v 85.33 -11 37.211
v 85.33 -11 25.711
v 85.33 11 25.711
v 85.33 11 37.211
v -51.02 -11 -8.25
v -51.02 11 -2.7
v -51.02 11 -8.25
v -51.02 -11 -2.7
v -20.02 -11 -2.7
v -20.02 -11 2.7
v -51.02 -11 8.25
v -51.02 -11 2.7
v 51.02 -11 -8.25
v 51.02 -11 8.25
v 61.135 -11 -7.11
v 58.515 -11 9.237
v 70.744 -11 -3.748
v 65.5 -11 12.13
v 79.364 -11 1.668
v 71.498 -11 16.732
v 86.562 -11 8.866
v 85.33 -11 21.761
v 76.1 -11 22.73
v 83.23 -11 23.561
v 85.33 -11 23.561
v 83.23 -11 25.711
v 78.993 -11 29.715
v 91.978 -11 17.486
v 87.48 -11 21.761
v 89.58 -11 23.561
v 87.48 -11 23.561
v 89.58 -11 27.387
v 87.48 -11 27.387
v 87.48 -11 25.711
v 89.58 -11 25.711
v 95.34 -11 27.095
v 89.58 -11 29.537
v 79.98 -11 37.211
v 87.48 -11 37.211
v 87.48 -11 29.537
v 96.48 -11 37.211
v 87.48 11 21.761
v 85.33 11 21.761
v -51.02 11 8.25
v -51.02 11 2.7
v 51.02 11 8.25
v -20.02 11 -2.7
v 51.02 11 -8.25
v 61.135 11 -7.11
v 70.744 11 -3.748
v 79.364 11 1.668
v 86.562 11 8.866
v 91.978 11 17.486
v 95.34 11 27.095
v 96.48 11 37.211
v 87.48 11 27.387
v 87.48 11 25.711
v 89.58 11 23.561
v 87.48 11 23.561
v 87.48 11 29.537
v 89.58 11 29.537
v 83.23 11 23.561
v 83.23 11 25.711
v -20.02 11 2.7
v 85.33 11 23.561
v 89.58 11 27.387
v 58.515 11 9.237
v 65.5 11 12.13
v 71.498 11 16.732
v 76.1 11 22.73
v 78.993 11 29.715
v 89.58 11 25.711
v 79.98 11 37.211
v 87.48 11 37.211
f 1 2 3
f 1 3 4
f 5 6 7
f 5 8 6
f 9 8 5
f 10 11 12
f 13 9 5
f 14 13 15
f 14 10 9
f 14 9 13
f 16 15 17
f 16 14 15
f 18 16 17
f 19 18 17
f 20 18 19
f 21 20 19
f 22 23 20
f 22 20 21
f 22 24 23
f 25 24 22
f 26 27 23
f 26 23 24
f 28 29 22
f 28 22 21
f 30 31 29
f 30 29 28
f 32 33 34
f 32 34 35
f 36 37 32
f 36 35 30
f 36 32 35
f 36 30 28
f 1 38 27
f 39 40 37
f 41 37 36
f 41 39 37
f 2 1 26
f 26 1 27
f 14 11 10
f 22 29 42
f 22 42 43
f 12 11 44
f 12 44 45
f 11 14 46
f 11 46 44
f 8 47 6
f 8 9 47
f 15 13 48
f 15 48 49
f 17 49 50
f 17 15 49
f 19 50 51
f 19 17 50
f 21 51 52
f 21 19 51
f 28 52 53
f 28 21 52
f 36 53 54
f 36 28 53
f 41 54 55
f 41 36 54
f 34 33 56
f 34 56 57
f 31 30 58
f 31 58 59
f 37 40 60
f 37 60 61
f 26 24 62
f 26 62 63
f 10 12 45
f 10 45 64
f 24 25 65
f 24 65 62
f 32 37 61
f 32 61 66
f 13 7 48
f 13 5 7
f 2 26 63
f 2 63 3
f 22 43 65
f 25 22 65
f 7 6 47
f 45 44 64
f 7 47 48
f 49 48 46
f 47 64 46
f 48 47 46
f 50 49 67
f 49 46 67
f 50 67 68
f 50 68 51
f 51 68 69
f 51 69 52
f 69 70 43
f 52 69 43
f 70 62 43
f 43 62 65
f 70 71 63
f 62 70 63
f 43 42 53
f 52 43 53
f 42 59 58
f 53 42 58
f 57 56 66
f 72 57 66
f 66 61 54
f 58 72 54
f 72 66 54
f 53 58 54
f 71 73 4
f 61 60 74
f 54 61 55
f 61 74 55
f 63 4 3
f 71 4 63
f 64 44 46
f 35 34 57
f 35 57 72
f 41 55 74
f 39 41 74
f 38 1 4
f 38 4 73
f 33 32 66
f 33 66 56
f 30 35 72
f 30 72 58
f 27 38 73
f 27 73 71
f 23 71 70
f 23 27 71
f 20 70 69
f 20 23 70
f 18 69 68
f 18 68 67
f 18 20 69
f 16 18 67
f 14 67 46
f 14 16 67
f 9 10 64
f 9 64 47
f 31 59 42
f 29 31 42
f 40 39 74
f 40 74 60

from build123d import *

# Parameters (mm, degrees)
F1_DEPTH = 11


# Not quite as in the source:
# - ends of sketch curves that miss each other by under 0.0002 mm in the source are joined
# - a feature names something its author has since deleted; it is built from what else it names


with BuildPart() as f1:
    # F0 (on Front) → F1 (new body, symmetric)
    with BuildSketch(Plane.XZ):
        Polygon((-51.0195, -8.25), (51.0195, -8.25), (51.0195, 8.25), (-51.0195, 8.25), (-51.0195, 2.7), (-20.0195, 2.7), (-20.0195, -2.7), (-51.0195, -2.7), align=None)
        with BuildLine():
            Line((51.0195, 8.25), (51.0195, -8.25))
            ThreePointArc((51.0195, -8.25), (83.1651110764, 5.0651480786), (96.4802591551, 37.2107591551))
            Line((96.4802591551, 37.2107591551), (87.4802576721, 37.2107591551))
            Line((87.4802576721, 37.2107591551), (87.4802576721, 29.5374569684))
            Line((87.4802576721, 29.5374569684), (89.5802576721, 29.5374569684))
            Line((89.5802576721, 29.5374569684), (89.5802576721, 27.3874569684))
            Line((89.5802576721, 27.3874569684), (87.4802576721, 27.3874569684))
            Line((87.4802576721, 27.3874569684), (87.4802576721, 25.7107576162))
            Line((87.4802576721, 25.7107576162), (89.5802576721, 25.7107576162))
            Line((89.5802576721, 25.7107576162), (89.5802576721, 23.5607576162))
            Line((89.5802576721, 23.5607576162), (87.4802576721, 23.5607576162))
            Line((87.4802576721, 23.5607576162), (87.4802576721, 21.7607576162))
            Line((87.4802576721, 21.7607576162), (85.3302576721, 21.7607576162))
            Line((85.3302576721, 21.7607576162), (85.3302576721, 23.5607576162))
            Line((85.3302576721, 23.5607576162), (83.2302576721, 23.5607576162))
            Line((83.2302576721, 23.5607576162), (83.2302576721, 25.7107576162))
            Line((83.2302576721, 25.7107576162), (85.3302576721, 25.7107576162))
            Line((85.3302576721, 25.7107576162), (85.3302576721, 37.2107591551))
            Line((85.3302576721, 37.2107591551), (79.9802576721, 37.2107591551))
            ThreePointArc((79.9802576721, 37.2107591551), (71.4978497843, 16.7324093708), (51.0195, 8.25))
        make_face()
    extrude(amount=F1_DEPTH, both=True)


solid = f1.part
